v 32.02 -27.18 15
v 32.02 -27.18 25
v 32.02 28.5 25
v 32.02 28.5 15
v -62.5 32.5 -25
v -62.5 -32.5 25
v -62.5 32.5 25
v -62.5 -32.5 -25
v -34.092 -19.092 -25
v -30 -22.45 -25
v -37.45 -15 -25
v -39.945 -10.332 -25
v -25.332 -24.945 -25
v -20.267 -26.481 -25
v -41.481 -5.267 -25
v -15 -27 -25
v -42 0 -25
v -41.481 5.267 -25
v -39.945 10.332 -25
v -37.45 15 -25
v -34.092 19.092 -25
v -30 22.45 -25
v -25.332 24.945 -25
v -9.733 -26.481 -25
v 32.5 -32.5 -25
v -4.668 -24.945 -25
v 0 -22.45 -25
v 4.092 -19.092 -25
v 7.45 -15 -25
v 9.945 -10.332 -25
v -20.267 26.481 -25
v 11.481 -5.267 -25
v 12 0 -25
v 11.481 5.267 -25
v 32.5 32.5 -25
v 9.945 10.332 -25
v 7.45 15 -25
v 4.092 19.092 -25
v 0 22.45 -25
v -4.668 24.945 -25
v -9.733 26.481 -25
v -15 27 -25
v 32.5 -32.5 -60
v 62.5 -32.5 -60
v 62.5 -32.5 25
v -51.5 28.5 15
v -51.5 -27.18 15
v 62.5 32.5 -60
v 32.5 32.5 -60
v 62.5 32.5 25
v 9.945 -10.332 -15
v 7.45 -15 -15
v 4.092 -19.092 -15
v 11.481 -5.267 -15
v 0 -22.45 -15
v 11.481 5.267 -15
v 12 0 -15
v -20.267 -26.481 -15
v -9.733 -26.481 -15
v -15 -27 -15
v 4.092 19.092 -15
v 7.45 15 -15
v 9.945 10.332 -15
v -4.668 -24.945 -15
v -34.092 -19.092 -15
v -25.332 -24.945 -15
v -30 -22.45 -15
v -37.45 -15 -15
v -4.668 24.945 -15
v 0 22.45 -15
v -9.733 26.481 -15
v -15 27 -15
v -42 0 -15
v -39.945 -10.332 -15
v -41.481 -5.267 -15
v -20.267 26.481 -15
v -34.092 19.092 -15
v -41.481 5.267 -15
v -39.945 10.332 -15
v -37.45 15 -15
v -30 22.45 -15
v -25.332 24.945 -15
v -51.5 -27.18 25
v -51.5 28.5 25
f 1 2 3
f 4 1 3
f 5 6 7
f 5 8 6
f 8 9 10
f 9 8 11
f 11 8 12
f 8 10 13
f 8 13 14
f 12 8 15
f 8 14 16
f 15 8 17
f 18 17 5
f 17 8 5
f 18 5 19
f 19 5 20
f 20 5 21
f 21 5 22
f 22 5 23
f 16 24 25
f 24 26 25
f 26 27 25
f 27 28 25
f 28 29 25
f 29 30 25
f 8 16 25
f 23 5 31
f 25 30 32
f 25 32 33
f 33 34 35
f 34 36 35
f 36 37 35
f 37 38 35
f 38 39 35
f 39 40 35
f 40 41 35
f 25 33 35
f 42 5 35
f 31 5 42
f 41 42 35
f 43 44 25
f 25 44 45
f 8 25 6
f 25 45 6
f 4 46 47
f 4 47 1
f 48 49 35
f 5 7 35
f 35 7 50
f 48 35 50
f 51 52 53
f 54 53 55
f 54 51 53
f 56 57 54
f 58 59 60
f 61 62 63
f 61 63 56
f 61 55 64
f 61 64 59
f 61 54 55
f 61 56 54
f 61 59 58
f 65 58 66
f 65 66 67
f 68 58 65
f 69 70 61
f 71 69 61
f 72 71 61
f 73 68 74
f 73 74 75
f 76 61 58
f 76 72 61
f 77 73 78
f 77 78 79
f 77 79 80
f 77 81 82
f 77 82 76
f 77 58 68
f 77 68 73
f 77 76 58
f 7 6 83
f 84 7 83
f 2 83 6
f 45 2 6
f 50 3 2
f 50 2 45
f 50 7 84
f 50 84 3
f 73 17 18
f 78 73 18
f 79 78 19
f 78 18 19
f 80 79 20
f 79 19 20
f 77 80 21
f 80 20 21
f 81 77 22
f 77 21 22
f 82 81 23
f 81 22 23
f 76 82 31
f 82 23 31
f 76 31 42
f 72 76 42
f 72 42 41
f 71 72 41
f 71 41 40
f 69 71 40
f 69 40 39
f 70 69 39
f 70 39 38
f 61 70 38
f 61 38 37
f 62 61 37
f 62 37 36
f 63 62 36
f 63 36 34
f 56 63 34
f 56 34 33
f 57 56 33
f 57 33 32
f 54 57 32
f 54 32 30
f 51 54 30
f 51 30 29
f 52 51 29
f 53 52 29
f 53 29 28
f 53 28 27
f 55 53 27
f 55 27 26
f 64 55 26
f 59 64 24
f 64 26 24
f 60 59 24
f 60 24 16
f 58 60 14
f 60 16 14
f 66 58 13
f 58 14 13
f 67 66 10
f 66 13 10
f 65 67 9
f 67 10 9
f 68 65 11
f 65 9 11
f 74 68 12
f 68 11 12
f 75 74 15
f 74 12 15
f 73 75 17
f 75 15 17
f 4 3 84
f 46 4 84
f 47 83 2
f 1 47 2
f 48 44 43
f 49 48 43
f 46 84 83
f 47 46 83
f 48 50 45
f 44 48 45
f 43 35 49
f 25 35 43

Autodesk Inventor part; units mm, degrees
ref_plane "YZ Plane" through (0, 0, 0) normal (1, 0, 0) x (0, 1, 0)
ref_plane "XZ Plane" through (0, 0, 0) normal (0, 1, 0) x (-1, 0, 0)
ref_plane "XY Plane" through (0, 0, 0) normal (0, 0, 1) x (1, 0, 0)
sketch "Náčrt1" plane through (0, 0, 0) normal (0, 0, 1) x (1, 0, 0)
  line L0 (-62.5, 32.5) -> (62.5, 32.5)
  line L1 (62.5, 32.5) -> (62.5, -32.5)
  line L2 (62.5, -32.5) -> (-62.5, -32.5)
  line L3 (-62.5, -32.5) -> (-62.5, 32.5)
  line L4 (-87.5, 0) -> (87.5, 0) projected
  line L5 (0, 45.5) -> (0, -45.5) projected
  point P0 (0, 0)
  dimension "d0" = 125
  dimension "d1" = 65
extrude "Vysunutí1" add sketch "Náčrt1" along normal mid plane 50
sketch "Náčrt2" plane through (0, 0, -25) normal (0, 0, -1) x (-1, 0, 0)
  line L0 (-87.5, 0) -> (87.5, 0) projected
  circle A0 centre (15, 0) radius 27
  line L1 (0, -45.5) -> (0, 45.5) projected
  dimension "d18" = 54
  dimension "d19" = 15
extrude "Vysunutí2" cut sketch "Náčrt2" against normal blind 10
sketch "Náčrt3" plane through (0, 0, 25) normal (0, 0, 1) x (1, 0, 0)
  line L0 (32.02, 28.5) -> (-51.5, 28.5)
  line L1 (-51.5, 28.5) -> (-51.5, -27.18)
  line L2 (-51.5, -27.18) -> (32.02, -27.18)
  line L3 (32.02, -27.18) -> (32.02, 28.5)
  line L4 (-62.5, 32.5) -> (-62.5, -32.5) projected
  line L5 (62.5, 32.5) -> (-62.5, 32.5) projected
  point P0 (0, 0)
  dimension "d8" = 83.52
  dimension "d9" = 55.68
  dimension "d11" = 11
  dimension "d12" = 4
extrude "Vysunutí3" cut sketch "Náčrt3" against normal blind 10
sketch "Náčrt4" plane through (0, 0, -25) normal (0, 0, -1) x (-1, 0, 0)
  line L0 (62.5, -32.5) -> (62.5, 32.5) projected
  line L1 (62.5, 32.5) -> (-62.5, 32.5) projected
  line L2 (-62.5, 32.5) -> (-62.5, -32.5) projected
  line L3 (-62.5, -32.5) -> (62.5, -32.5) projected
  line L4 (-62.5, 32.5) -> (-32.5, 32.5)
  line L5 (-32.5, 32.5) -> (-32.5, -33.9338)
  line L6 (-32.5, -33.9338) -> (-62.5, -33.9338)
  line L7 (-62.5, -33.9338) -> (-62.5, 32.5)
  point P0 (0, 0)
  point P1 (-32.5, -32.5)
  dimension "d15" = 30
extrude "Vysunutí4" add sketch "Náčrt4" along normal blind 35 contours L3 L2 L1 L5
properties part number "telo1"
